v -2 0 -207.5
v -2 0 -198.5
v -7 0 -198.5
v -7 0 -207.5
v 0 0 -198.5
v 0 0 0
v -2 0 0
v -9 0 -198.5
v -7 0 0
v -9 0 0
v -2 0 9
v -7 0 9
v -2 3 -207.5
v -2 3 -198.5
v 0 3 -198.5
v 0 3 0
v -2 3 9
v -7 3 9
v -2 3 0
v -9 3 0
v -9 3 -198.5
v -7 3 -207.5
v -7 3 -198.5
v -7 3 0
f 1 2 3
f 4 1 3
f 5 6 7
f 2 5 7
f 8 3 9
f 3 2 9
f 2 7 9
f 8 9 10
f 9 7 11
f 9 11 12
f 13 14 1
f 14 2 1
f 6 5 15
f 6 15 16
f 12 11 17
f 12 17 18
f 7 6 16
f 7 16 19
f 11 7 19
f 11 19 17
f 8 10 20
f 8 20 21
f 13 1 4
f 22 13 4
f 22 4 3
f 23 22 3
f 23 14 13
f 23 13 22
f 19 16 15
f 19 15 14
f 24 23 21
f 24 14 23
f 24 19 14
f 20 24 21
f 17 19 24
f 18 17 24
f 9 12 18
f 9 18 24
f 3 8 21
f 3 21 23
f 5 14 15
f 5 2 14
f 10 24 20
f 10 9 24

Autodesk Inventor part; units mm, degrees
ref_plane "YZ Plane" through (0, 0, 0) normal (1, 0, 0) x (0, 1, 0)
ref_plane "XZ Plane" through (0, 0, 0) normal (0, 1, 0) x (-1, 0, 0)
ref_plane "XY Plane" through (0, 0, 0) normal (0, 0, 1) x (1, 0, 0)
sketch "草圖1" plane through (0, 0, 0) normal (0, 1, 0) x (-1, 0, 0)
  line L0 (0, 0) -> (9, 0)
  line L1 (9, 0) -> (9, -198.5)
  line L2 (9, -198.5) -> (0, -198.5)
  line L3 (0, -198.5) -> (0, 0)
  line L4 (7, 0) -> (2, 0)
  line L5 (2, 0) -> (2, 9)
  line L6 (2, 9) -> (7, 9)
  line L7 (7, 9) -> (7, 0)
  line L8 (7, -198.5) -> (2, -198.5)
  line L9 (2, -198.5) -> (2, -207.5)
  line L10 (2, -207.5) -> (7, -207.5)
  line L11 (7, -207.5) -> (7, -198.5)
  point P0 (4.5, 0)
  point P1 (4.5, -198.5)
  dimension "d0" = 198.5
  dimension "d1" = 9
  dimension "d2" = 9
  dimension "d3" = 5
  dimension "d4" = 9
  dimension "d5" = 5
extrude "擠出1" add sketch "草圖1" along normal blind 3
properties part number "side_Bar" material "MDF Medium Density Fiberboard"
